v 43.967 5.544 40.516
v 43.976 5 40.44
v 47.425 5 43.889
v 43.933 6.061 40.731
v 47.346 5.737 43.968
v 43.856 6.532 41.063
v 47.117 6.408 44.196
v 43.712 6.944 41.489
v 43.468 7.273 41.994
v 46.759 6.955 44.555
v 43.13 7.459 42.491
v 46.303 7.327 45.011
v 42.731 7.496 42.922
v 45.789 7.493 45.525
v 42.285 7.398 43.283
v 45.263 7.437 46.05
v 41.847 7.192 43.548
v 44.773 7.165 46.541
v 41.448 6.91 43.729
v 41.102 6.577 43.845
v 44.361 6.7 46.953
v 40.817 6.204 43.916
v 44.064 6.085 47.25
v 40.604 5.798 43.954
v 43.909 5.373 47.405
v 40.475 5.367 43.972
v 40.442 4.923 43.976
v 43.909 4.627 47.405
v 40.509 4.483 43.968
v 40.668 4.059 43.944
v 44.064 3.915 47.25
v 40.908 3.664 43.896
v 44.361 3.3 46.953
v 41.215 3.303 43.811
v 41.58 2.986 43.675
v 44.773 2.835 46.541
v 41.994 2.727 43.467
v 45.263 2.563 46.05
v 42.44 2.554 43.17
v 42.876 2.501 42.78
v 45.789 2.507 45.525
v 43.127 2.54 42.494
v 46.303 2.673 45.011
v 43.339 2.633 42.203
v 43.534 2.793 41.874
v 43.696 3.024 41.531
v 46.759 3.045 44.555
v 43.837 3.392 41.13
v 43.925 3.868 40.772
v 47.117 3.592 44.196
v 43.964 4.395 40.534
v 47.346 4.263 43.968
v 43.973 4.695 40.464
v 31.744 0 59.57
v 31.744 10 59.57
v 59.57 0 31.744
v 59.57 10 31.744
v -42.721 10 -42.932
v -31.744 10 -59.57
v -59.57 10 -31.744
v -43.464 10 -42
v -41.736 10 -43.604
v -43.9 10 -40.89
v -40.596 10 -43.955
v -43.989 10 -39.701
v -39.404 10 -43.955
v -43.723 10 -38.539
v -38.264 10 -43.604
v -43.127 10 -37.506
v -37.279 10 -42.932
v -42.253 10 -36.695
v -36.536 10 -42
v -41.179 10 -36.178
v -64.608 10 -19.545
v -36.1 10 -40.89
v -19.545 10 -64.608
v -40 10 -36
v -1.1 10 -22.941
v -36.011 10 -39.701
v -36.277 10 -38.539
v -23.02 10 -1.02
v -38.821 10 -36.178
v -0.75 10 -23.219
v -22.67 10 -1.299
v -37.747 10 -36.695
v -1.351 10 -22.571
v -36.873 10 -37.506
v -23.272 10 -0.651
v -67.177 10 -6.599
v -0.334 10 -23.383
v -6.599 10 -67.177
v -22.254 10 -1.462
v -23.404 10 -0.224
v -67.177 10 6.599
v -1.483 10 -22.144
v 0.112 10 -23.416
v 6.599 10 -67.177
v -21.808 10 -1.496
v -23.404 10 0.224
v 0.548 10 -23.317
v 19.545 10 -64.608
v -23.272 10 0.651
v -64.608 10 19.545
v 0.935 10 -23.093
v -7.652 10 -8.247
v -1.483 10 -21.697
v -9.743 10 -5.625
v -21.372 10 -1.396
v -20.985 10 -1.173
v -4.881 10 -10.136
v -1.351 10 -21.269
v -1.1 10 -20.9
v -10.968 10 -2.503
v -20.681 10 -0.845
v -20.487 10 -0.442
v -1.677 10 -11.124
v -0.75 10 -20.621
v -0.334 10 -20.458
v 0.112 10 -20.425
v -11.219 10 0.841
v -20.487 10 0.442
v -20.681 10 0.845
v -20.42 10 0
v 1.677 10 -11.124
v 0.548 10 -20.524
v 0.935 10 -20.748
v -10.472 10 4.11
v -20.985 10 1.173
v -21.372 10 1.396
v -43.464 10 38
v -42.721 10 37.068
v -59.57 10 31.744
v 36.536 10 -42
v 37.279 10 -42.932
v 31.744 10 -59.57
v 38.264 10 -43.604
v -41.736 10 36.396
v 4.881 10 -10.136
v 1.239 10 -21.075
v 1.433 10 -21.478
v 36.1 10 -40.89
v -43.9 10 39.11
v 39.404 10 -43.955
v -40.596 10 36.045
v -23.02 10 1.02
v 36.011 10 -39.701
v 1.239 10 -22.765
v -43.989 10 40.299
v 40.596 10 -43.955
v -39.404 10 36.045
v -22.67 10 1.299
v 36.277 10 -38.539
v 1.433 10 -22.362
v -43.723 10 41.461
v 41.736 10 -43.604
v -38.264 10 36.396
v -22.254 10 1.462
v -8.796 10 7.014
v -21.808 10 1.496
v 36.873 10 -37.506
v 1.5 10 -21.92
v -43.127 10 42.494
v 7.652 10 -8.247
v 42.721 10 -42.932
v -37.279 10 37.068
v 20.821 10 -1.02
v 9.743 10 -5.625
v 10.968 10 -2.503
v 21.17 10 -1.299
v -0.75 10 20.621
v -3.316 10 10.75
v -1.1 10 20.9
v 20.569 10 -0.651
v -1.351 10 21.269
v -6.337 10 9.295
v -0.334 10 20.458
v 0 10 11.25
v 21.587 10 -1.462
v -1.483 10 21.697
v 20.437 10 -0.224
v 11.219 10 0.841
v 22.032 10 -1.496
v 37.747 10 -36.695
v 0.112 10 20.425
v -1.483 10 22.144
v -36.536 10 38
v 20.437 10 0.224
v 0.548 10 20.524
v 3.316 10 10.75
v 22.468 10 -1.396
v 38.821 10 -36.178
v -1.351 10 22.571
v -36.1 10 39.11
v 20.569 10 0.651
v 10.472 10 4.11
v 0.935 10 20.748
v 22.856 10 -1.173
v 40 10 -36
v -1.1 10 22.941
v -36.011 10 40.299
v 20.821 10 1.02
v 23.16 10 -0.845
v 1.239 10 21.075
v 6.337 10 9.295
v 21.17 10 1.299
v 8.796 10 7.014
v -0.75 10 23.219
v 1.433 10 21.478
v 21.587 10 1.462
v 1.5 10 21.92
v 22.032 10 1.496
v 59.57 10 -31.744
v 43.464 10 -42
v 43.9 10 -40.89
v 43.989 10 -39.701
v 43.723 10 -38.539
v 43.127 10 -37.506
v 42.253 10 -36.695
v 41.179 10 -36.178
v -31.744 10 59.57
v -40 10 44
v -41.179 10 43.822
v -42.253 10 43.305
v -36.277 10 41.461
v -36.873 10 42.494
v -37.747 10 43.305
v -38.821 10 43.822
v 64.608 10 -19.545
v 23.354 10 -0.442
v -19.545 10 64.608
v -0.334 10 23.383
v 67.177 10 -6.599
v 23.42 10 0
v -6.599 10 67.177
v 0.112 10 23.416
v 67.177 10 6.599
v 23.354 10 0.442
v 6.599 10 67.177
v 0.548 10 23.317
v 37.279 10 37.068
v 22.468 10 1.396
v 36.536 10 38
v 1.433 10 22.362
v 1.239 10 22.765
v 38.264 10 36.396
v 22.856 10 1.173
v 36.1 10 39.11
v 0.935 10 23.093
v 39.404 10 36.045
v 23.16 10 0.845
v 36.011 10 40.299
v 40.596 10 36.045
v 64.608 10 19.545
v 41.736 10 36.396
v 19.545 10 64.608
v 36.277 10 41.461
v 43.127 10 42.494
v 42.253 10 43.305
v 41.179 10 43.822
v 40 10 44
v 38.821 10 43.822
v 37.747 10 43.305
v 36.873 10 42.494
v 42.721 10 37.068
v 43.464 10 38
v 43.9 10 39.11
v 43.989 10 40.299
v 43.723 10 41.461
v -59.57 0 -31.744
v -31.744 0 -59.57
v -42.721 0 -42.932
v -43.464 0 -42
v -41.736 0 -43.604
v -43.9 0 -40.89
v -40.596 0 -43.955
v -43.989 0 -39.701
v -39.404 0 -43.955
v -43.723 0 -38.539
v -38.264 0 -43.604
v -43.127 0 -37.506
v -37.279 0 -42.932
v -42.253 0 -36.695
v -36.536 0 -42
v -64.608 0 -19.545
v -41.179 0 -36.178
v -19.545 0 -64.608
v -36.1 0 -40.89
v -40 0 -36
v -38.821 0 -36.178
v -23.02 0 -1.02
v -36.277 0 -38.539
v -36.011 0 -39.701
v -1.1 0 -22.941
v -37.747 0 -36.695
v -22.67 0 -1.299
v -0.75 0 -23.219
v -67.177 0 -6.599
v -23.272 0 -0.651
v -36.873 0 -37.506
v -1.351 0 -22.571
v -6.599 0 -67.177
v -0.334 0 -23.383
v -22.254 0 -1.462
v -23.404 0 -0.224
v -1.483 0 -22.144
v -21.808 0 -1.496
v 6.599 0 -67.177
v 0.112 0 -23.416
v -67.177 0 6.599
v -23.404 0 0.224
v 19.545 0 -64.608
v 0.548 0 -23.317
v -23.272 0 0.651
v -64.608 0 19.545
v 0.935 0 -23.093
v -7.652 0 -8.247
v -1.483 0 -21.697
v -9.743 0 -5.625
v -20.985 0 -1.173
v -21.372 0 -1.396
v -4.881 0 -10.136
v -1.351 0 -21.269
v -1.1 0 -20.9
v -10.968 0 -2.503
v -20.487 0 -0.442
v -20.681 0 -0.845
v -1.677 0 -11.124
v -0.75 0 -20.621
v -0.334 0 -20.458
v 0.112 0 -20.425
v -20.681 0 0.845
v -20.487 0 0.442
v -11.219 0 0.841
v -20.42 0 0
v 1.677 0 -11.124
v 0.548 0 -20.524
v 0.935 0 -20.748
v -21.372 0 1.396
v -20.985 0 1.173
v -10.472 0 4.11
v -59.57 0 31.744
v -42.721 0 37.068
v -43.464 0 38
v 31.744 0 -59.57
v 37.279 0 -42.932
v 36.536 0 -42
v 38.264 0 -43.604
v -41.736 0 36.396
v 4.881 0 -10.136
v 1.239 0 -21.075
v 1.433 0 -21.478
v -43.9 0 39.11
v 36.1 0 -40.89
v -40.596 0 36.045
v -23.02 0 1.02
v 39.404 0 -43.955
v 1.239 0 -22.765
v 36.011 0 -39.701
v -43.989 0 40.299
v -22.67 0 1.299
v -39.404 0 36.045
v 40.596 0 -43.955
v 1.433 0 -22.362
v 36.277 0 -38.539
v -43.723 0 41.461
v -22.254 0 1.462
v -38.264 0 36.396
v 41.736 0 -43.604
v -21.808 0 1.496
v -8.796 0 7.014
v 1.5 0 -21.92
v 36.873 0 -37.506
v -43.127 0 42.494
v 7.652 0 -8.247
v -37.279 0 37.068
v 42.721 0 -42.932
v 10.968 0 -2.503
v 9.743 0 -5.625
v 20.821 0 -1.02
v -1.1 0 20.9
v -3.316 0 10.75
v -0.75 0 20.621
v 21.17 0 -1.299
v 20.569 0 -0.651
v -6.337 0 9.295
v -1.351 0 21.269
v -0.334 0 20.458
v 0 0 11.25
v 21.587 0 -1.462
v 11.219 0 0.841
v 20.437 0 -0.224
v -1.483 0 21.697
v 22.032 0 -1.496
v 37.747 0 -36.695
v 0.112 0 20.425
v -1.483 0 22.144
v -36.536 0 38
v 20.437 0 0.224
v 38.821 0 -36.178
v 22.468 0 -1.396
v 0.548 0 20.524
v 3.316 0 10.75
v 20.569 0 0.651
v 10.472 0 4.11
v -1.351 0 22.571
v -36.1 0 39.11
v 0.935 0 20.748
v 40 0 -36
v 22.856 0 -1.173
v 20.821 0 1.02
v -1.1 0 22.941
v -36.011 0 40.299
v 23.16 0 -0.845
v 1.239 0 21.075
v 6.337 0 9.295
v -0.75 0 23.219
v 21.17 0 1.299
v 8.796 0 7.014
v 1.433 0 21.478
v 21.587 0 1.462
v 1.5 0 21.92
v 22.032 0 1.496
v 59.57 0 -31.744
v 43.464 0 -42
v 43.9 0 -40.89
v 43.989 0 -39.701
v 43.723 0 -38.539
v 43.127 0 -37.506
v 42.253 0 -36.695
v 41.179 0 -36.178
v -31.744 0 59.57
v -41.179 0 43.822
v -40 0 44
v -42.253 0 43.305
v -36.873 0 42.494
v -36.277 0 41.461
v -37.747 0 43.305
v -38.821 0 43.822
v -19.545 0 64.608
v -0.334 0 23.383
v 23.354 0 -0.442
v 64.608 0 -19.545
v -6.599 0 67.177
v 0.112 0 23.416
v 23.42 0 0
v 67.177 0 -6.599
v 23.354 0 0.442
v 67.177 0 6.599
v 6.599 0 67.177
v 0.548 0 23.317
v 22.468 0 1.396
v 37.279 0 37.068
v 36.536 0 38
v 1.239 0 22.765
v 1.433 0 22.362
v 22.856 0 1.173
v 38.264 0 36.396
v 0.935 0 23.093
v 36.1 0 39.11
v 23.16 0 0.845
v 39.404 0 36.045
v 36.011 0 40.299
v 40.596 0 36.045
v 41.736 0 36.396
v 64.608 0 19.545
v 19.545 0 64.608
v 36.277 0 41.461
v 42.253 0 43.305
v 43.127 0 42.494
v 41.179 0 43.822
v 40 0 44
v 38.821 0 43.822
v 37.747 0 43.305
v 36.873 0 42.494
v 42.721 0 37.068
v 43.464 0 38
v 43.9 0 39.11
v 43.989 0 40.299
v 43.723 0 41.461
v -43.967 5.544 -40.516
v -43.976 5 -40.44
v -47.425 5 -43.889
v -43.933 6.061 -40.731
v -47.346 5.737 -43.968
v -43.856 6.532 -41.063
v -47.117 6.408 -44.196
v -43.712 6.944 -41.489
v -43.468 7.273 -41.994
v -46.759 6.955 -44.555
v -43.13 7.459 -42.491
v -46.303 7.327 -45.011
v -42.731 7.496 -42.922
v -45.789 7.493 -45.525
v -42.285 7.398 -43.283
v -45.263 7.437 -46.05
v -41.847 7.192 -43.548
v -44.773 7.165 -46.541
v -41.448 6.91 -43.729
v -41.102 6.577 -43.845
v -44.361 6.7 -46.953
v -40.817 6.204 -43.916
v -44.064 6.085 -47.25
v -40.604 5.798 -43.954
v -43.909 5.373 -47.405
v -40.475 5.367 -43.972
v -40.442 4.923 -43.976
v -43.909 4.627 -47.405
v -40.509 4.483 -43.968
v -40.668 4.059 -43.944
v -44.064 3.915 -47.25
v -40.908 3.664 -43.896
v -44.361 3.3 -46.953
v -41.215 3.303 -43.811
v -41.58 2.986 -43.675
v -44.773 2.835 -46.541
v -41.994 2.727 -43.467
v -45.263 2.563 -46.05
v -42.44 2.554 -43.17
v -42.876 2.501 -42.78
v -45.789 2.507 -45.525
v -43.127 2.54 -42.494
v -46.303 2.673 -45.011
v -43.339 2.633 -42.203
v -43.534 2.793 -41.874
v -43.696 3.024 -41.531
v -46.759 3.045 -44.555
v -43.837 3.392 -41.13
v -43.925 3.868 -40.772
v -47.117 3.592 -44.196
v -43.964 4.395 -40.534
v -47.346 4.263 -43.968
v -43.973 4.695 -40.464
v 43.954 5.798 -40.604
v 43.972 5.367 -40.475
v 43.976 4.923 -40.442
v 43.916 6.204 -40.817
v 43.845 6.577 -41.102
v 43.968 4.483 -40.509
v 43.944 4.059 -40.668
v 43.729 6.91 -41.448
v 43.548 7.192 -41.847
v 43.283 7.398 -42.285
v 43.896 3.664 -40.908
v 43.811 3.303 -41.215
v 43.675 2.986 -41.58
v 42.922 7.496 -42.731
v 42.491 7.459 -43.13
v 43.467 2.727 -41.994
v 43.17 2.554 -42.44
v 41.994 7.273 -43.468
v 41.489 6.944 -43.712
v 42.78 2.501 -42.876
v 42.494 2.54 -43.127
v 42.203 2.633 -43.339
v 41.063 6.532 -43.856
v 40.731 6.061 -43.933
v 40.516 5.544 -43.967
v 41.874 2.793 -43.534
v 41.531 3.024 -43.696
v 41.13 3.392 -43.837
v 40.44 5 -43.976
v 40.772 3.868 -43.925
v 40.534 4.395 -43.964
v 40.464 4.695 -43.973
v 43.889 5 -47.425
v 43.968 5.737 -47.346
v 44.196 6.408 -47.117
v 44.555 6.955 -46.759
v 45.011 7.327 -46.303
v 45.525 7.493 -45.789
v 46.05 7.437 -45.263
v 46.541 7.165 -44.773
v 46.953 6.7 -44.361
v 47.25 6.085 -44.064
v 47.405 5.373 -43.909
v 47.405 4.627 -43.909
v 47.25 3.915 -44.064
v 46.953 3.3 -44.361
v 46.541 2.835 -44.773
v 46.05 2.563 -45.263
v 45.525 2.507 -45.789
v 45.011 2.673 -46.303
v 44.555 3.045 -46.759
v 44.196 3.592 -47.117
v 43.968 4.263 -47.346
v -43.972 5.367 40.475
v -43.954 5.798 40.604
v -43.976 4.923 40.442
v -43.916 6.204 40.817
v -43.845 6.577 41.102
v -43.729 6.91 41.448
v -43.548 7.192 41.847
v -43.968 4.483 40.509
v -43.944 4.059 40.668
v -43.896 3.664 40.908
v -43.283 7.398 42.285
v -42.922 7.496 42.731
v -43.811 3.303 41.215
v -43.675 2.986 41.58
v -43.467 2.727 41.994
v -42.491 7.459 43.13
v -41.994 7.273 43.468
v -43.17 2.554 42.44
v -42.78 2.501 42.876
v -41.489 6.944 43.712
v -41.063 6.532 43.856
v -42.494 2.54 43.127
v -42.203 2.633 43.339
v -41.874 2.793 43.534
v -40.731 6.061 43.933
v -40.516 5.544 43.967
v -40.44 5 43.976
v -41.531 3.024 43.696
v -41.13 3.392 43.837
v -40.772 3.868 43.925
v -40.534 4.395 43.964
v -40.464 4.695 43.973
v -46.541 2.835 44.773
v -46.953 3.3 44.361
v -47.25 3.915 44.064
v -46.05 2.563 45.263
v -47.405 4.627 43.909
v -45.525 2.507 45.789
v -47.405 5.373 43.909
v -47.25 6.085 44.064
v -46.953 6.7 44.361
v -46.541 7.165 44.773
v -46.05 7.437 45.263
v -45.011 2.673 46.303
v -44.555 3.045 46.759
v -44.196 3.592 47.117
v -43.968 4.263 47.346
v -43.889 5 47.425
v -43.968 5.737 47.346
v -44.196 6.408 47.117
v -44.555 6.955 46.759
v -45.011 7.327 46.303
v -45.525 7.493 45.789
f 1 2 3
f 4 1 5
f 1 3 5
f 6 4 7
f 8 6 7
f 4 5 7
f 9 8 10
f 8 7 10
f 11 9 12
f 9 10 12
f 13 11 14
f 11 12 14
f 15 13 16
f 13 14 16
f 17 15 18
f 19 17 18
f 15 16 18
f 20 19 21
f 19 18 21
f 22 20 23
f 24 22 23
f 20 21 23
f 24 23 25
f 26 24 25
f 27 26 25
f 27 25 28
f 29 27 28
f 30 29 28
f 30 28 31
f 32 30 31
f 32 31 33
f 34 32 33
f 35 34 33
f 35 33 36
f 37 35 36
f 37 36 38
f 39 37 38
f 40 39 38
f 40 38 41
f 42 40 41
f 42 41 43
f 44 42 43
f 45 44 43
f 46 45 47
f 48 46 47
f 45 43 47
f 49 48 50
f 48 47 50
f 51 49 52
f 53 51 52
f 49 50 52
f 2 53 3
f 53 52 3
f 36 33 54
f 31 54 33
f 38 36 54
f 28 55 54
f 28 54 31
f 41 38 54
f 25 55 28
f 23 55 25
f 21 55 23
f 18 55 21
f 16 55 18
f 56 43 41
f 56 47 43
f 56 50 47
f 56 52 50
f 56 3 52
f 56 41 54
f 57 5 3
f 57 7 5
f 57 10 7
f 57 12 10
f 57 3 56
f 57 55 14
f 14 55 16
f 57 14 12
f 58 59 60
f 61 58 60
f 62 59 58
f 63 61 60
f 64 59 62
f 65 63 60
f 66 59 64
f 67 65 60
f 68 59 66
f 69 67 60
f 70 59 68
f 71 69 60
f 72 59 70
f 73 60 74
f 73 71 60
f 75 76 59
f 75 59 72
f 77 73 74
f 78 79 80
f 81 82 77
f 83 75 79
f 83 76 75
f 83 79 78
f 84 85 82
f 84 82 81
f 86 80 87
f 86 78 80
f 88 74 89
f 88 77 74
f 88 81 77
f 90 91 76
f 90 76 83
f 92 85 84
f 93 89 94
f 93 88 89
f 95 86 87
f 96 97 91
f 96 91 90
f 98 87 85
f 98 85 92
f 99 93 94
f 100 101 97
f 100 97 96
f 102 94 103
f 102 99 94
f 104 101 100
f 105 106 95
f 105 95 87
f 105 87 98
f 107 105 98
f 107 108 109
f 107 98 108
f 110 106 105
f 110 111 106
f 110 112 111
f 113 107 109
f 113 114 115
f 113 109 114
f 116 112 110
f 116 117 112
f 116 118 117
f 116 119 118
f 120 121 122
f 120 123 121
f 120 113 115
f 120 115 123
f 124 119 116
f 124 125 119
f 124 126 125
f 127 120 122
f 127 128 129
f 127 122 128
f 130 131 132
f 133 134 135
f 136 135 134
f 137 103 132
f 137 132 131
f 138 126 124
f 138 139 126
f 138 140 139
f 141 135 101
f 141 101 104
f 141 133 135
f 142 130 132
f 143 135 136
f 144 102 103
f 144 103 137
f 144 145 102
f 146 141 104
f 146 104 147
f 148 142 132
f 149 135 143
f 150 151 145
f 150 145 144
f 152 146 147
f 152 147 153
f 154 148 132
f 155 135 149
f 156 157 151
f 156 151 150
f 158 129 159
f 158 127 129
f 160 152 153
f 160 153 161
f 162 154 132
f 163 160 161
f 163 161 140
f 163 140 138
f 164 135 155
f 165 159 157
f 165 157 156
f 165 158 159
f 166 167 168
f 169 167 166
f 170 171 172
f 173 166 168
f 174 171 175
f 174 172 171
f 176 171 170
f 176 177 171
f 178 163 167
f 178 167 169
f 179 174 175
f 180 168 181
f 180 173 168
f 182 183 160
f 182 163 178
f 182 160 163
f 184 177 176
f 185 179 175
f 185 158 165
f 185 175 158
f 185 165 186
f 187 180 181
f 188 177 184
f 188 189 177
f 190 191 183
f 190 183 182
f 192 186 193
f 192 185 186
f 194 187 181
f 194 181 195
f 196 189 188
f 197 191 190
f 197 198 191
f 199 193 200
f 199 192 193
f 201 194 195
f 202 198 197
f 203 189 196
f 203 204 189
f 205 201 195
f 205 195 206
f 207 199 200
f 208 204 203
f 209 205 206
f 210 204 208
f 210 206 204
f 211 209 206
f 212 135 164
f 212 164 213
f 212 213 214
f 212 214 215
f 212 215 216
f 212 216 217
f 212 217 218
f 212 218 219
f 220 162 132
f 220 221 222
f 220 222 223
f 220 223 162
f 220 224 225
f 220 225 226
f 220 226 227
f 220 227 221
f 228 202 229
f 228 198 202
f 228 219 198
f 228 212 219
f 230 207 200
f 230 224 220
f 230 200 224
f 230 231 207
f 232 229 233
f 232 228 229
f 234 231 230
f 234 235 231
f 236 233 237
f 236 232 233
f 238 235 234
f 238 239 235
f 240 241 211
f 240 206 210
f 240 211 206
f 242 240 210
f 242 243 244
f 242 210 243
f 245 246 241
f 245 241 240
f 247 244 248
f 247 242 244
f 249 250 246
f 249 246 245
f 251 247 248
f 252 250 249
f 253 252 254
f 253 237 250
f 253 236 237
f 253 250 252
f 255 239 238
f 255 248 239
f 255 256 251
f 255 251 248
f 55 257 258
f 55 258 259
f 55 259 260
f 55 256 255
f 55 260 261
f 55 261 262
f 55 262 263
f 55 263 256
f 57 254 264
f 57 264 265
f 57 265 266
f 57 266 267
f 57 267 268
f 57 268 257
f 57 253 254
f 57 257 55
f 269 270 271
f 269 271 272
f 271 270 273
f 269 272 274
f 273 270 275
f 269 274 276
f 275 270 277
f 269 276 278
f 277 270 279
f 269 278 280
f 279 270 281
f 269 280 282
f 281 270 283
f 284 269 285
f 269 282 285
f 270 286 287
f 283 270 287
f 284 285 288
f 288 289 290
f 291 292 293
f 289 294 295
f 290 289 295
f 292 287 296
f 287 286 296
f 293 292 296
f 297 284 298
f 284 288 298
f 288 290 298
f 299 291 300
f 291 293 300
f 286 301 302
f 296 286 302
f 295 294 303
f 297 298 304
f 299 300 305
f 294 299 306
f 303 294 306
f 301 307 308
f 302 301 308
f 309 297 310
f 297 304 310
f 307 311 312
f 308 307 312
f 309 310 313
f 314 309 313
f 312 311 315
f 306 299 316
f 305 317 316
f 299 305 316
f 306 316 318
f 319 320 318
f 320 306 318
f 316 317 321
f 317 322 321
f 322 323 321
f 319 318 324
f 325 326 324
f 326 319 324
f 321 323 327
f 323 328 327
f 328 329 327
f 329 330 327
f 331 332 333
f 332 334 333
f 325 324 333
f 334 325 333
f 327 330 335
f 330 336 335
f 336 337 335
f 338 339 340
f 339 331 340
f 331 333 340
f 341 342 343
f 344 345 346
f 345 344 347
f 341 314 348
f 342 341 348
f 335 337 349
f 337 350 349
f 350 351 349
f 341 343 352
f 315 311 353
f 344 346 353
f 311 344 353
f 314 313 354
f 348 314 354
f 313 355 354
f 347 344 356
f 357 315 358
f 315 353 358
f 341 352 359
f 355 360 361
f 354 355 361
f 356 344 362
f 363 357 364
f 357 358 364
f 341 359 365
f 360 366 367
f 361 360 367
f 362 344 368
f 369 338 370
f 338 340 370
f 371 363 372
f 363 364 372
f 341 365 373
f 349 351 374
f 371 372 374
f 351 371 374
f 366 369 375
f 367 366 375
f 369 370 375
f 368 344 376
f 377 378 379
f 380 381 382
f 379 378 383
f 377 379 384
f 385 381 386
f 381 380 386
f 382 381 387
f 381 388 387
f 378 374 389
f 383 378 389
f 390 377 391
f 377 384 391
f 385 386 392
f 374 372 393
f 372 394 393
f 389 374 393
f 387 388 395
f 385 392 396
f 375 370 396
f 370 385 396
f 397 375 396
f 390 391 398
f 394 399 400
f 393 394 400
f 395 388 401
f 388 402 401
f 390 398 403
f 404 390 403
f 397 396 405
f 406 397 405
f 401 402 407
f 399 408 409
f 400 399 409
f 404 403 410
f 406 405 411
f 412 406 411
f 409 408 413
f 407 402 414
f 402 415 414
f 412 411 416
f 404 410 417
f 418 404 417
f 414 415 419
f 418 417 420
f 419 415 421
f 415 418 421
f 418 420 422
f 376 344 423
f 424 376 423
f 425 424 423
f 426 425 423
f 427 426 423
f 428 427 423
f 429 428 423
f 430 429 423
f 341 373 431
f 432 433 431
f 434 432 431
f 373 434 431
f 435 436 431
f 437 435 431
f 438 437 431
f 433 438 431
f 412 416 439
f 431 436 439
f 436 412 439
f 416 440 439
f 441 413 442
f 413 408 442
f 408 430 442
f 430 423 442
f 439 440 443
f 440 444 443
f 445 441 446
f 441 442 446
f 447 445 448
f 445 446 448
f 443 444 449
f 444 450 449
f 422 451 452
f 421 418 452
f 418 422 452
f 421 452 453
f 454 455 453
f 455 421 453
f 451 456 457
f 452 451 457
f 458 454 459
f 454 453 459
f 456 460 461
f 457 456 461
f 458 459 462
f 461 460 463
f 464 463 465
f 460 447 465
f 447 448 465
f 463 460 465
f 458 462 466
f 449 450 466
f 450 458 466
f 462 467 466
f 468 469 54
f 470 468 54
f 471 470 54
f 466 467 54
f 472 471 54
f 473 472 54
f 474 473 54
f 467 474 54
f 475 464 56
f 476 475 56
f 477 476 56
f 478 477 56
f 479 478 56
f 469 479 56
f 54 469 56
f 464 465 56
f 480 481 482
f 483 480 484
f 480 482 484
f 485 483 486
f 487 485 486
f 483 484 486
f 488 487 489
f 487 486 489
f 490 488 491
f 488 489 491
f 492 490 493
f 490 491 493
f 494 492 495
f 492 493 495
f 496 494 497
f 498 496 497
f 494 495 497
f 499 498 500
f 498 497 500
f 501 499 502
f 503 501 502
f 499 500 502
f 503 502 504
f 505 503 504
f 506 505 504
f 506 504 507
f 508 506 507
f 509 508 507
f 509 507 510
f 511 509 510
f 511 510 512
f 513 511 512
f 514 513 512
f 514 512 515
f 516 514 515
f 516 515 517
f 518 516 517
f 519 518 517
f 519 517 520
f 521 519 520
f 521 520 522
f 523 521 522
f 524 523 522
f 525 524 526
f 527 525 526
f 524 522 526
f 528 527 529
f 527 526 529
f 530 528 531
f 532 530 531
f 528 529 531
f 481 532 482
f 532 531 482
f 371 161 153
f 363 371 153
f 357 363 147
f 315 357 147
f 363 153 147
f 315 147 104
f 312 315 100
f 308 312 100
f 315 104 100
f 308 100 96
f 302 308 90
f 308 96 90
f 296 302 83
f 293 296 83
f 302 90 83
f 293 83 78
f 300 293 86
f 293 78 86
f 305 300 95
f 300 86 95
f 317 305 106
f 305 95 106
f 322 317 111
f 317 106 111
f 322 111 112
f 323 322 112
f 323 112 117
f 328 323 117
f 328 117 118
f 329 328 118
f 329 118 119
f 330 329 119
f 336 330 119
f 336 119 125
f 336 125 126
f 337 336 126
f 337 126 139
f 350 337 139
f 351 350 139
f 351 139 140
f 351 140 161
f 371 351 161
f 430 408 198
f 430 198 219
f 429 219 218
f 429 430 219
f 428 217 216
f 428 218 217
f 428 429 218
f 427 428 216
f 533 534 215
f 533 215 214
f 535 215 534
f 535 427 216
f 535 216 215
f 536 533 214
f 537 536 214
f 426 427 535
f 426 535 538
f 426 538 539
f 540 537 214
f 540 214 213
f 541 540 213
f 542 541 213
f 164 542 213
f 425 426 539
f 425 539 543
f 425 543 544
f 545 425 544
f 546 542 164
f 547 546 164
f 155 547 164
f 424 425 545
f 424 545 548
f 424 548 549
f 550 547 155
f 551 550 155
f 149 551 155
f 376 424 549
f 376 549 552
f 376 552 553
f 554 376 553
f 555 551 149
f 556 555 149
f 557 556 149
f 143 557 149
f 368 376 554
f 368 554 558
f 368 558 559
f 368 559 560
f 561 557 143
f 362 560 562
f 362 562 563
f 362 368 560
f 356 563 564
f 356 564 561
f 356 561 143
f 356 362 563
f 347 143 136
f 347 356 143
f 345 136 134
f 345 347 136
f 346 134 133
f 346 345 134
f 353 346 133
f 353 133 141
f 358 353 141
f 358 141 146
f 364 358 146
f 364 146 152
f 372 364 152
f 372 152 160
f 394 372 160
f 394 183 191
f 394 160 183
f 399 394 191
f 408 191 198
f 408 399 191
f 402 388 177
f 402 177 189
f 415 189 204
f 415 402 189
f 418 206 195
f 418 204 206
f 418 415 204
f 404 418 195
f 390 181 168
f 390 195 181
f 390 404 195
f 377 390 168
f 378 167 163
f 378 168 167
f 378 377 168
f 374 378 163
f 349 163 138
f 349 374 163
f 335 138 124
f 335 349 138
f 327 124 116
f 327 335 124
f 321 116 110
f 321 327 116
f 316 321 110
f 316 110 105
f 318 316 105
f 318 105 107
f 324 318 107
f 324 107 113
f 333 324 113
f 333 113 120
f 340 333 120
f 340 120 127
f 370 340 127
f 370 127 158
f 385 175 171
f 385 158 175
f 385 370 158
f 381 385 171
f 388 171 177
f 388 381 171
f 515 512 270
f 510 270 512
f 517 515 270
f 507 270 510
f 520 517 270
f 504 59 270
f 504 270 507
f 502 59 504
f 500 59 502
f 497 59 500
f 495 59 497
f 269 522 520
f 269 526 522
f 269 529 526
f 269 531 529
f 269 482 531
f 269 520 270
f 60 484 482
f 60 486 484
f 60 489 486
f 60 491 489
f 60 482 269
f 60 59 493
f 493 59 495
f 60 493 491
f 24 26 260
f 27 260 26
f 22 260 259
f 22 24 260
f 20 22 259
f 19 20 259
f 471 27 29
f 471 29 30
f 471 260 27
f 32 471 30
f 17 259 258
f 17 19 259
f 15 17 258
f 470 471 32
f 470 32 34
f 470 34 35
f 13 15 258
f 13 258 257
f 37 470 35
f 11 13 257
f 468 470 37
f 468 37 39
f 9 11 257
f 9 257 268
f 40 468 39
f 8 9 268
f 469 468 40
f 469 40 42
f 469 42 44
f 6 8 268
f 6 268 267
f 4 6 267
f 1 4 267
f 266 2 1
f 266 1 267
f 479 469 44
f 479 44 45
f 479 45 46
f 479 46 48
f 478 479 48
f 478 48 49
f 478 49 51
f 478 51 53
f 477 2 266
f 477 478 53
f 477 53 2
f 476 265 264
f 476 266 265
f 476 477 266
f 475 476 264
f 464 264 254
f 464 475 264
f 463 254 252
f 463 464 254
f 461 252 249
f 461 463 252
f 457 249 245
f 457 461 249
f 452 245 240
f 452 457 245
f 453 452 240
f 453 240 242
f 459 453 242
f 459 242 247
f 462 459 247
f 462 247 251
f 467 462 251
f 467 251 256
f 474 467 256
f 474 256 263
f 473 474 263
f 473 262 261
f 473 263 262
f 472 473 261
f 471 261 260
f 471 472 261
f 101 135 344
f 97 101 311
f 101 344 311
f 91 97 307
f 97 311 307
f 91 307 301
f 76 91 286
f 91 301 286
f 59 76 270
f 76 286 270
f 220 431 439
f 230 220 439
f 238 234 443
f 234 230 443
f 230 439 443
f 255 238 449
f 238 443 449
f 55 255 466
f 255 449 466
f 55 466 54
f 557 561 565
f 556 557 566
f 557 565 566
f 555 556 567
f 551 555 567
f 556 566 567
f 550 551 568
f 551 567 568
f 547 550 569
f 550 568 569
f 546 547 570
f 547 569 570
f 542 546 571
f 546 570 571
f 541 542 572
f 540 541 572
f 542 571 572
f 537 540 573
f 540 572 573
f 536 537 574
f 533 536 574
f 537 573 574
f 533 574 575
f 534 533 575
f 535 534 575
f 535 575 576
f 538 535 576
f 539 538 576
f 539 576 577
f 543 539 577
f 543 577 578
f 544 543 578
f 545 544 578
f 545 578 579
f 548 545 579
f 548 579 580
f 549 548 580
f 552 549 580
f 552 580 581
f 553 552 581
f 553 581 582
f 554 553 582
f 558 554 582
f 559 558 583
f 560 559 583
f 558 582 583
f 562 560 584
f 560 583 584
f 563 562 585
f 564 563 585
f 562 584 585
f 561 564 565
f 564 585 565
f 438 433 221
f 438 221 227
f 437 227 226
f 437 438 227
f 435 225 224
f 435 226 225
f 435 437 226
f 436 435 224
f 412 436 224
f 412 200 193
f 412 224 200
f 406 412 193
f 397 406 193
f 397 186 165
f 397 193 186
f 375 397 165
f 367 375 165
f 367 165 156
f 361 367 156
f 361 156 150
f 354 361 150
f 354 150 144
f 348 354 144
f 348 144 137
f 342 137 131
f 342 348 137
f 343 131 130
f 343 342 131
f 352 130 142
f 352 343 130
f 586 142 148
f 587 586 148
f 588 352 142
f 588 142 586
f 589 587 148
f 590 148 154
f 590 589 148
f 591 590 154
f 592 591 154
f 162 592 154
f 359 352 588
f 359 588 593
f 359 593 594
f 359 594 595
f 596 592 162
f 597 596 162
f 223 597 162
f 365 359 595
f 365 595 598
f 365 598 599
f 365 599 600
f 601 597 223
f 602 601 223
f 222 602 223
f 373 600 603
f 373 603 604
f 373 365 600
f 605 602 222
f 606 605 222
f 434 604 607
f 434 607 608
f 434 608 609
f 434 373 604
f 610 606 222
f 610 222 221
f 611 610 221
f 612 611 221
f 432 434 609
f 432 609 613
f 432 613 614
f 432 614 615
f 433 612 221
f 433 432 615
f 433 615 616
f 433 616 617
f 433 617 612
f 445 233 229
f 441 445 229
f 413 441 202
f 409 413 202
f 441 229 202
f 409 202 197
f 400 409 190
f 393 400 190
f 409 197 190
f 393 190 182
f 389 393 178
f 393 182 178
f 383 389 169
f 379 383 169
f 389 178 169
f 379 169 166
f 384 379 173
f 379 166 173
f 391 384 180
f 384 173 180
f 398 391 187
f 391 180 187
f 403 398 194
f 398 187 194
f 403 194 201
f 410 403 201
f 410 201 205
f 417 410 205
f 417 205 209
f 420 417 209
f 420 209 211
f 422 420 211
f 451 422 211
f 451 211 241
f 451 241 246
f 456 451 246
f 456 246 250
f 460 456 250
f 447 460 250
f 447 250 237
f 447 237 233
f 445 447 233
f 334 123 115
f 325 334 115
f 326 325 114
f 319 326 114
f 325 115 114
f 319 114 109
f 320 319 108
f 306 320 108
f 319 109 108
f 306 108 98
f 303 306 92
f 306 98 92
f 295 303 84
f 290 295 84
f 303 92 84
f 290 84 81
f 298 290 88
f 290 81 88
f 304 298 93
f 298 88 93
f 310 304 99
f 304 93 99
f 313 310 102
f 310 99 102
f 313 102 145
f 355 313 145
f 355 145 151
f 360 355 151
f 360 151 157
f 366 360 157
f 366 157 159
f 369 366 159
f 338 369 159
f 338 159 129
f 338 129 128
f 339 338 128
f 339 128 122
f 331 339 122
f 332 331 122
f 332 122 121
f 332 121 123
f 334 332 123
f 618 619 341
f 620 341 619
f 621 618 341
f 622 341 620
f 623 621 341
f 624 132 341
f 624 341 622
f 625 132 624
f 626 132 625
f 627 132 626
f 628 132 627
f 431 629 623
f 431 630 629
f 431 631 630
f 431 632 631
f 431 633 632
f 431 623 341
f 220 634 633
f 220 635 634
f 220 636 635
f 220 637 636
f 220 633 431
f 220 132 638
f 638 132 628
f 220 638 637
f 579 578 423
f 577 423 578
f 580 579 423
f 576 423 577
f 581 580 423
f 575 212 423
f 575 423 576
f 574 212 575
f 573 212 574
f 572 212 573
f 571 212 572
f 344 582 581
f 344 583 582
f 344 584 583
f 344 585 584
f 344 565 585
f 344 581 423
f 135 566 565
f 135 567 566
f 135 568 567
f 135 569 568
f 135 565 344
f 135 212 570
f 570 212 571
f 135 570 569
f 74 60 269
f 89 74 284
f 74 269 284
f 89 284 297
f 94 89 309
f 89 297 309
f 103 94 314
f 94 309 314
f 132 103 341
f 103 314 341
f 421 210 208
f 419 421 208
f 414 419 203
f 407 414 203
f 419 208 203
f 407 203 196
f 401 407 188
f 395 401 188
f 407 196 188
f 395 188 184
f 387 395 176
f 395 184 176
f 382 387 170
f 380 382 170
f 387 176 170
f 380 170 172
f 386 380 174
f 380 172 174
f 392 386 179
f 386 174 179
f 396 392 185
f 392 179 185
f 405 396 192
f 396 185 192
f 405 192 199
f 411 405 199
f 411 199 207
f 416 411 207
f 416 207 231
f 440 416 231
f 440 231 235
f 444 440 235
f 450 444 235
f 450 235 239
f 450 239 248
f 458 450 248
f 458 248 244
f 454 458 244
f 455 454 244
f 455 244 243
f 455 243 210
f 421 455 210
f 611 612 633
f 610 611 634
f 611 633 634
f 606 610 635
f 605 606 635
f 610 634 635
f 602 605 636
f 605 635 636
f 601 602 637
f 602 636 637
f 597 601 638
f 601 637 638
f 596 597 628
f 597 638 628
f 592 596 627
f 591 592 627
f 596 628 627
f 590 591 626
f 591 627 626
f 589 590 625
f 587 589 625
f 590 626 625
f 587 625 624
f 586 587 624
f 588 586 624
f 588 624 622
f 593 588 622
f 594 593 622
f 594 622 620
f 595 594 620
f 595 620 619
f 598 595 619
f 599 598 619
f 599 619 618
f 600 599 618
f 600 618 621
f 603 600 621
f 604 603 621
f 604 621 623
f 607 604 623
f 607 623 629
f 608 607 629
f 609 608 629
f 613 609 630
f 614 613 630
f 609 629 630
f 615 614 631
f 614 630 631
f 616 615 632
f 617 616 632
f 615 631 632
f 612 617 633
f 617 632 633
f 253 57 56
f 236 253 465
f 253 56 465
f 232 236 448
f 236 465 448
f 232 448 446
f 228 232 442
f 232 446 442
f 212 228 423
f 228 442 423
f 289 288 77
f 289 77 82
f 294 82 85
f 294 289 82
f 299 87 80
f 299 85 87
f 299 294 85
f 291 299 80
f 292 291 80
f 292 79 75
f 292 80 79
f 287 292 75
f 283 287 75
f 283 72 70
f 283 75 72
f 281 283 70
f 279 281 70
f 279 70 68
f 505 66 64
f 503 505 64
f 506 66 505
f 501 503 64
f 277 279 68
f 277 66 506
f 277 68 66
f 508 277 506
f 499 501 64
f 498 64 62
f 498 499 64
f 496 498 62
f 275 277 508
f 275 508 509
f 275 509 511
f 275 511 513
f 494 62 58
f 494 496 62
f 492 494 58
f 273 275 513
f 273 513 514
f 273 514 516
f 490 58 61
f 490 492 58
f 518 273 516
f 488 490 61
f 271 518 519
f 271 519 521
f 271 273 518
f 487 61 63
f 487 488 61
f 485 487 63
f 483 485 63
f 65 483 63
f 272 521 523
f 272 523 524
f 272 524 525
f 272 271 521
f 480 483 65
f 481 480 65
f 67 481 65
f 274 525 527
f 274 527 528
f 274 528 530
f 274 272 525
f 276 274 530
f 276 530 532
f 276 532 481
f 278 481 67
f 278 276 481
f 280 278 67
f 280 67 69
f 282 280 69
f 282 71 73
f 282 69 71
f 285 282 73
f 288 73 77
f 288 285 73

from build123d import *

# Parameters (mm, degrees)
SKETCH1_R                  = 67.5
BOSS_EXTRUDE1_DEPTH        = 10
CUT_EXTRUDE1_DEPTH         = 96.981769102
CUT_EXTRUDE1_DEPTH_BACK    = 96.981769102
SKETCH4_R                  = 4
CUT_EXTRUDE_THIN1_DEPTH    = 96.981769102
F_5_0MM_DOWEL_HOLE1_REACH  = 162.34
F_5_0MM_DOWEL_HOLE1_BORE_R = 2.5
CIRPATTERN1_COUNT          = 4
F_3_0MM_DOWEL_HOLE1_D      = 3
CUT_EXTRUDE2_DEPTH         = 96.981769113
CUT_EXTRUDE2_DEPTH_BACK    = 96.981769113
SKETCH13_R                 = 11.25


with BuildPart() as part:
    # Sketch1 → Boss-Extrude1 (new body)
    with BuildSketch(Plane(origin=(0, 0, 0), x_dir=(1, 0, 0), z_dir=(0, 1, 0))):
        with Locations(Location((0, 0, 0), (0, 0, 270))):
            Circle(SKETCH1_R)
    extrude(amount=BOSS_EXTRUDE1_DEPTH)

    # Sketch4 → Cut-Extrude1 (cut, two sides: drawn at the far end of the back side and taken through both)
    with BuildSketch(Plane(origin=(0, 10, 0), x_dir=(1, 0, 0), z_dir=(0, 1, 0)).offset(-CUT_EXTRUDE1_DEPTH_BACK)):
        with Locations(Location((-40, 40, 0), (0, 0, 270))):
            Circle(SKETCH4_R)
        with Locations(Location((40, 40, 0), (0, 0, 270))):
            Circle(SKETCH4_R)
        with Locations(Location((40, -40, 0), (0, 0, 270))):
            Circle(SKETCH4_R)
        with Locations(Location((-40, -40, 0), (0, 0, 270))):
            Circle(SKETCH4_R)
    extrude(amount=CUT_EXTRUDE1_DEPTH + CUT_EXTRUDE1_DEPTH_BACK, mode=Mode.SUBTRACT)

    # Sketch5 → Cut-Extrude-Thin1 (cut, through all)
    with BuildSketch(Plane(origin=(0, 10, 0), x_dir=(1, 0, 0), z_dir=(0, 1, 0))):
        Polygon((-31.743671291, 59.570037208), (-59.570037208, 31.743671291), (-66.64110502, 38.814739103), (-38.814739103, 66.64110502), align=None)
        Polygon((59.570037208, 31.743671291), (31.743671291, 59.570037208), (38.814739103, 66.64110502), (66.64110502, 38.814739103), align=None)
        Polygon((31.743671291, -59.570037208), (59.570037208, -31.743671291), (66.64110502, -38.814739103), (38.814739103, -66.64110502), align=None)
        Polygon((-59.570037208, -31.743671291), (-31.743671291, -59.570037208), (-38.814739103, -66.64110502), (-66.64110502, -38.814739103), align=None)
    extrude(amount=-CUT_EXTRUDE_THIN1_DEPTH, mode=Mode.SUBTRACT)

    # Ø5.0mm Dowel Hole1 bore → Ø5.0mm Dowel Hole1 (cut, up to next)
    with BuildSketch(Plane(origin=(45.656854249, 0, 45.656854249), x_dir=(0.7071067811865479, 0, -0.7071067811865471), z_dir=(0.7071067811865471, 0, 0.7071067811865479)), mode=Mode.PRIVATE) as f_5_0mm_dowel_hole1_sk1:
        with Locations((0, 5)):
            Circle(F_5_0MM_DOWEL_HOLE1_BORE_R)
    f_5_0mm_dowel_hole1_tool1 = extrude(f_5_0mm_dowel_hole1_sk1.sketch, amount=-F_5_0MM_DOWEL_HOLE1_REACH, mode=Mode.PRIVATE) & part.part
    f_5_0mm_dowel_hole1 = f_5_0mm_dowel_hole1_tool1.solids().sort_by_distance((45.656854, 5, 45.656854))[0]
    add(f_5_0mm_dowel_hole1, mode=Mode.SUBTRACT)

    # CirPattern1: Ø5.0mm Dowel Hole1 ×4 about axis
    cirpattern1_axis = Axis((0, 10, 0), (0, -1, 0))
    for i in range(1, CIRPATTERN1_COUNT):
        add(f_5_0mm_dowel_hole1.rotate(cirpattern1_axis, i * 360 / CIRPATTERN1_COUNT), mode=Mode.SUBTRACT)

    # Ø3.0mm Dowel Hole1 (through all)
    with Locations(Plane(origin=(0, 0, 0), x_dir=(-1, 0, 0), z_dir=(0, -1, 0))):
        with Locations((0, 21.920310217), (21.920310217, 0), (-21.920310217, 0), (0, -21.920310217)):
            Hole(F_3_0MM_DOWEL_HOLE1_D / 2)

    # Sketch13 → Cut-Extrude2 (cut, two sides: drawn at the far end of the back side and taken through both)
    with BuildSketch(Plane(origin=(0, 10, 0), x_dir=(1, 0, 0), z_dir=(0, 1, 0)).offset(-CUT_EXTRUDE2_DEPTH_BACK)):
        with Locations(Location((0, 0, 0), (0, 0, 270))):
            Circle(SKETCH13_R)
    extrude(amount=CUT_EXTRUDE2_DEPTH + CUT_EXTRUDE2_DEPTH_BACK, mode=Mode.SUBTRACT)


solid = part.part
